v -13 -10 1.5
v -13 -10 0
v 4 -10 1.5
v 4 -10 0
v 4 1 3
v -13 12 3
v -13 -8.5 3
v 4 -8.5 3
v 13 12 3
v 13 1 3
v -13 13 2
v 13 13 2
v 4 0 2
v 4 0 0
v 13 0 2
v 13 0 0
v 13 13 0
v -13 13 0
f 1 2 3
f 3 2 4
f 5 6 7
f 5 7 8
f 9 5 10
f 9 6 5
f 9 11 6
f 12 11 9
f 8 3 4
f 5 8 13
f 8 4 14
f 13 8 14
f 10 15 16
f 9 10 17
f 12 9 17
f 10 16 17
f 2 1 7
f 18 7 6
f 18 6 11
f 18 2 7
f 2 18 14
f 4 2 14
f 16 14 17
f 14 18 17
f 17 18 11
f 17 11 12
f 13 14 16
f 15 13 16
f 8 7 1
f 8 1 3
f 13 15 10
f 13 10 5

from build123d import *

# Parameters (mm, degrees)
SKETCH_1_W          = 26
SKETCH_1_H          = 23
EXTRUDE_1_DEPTH     = 3
CHAMFER_1_SIZE      = 1.5
CUT_EXTRUDE_1_DEPTH = 4
CHAMFER_2_SIZE      = 1


with BuildPart() as part:
    # Эскиз1 → Вытянуть1 (new body)
    with BuildSketch(Plane.XY):
        with Locations((0, 1.5)):
            Rectangle(SKETCH_1_W, SKETCH_1_H)
    extrude(amount=EXTRUDE_1_DEPTH)

    # Фаска1
    chamfer_1_edges = [part.edges().sort_by_distance(p)[0] for p in [
        (0, -10, 3),
    ]]
    chamfer(chamfer_1_edges, length=CHAMFER_1_SIZE)

    # Эскиз2 → Вырез-Вытянуть1 (cut, through all)
    with BuildSketch(Plane(origin=(0, 0, 0), x_dir=(-1, 0, 0), z_dir=(0, 0, -1))):
        Polygon((-81.137767415, 0), (-13, 0), (-4, 0), (-4, -10), (-4, -78.137767415), (-100.979926637, -173.876553822), (-178.117694052, -95.738786407), align=None)
    extrude(amount=-CUT_EXTRUDE_1_DEPTH, mode=Mode.SUBTRACT)

    # Фаска2
    chamfer_2_edges = [part.edges().sort_by_distance(p)[0] for p in [
        (0, 13, 3),
        (8.5, 0, 3),
    ]]
    chamfer(chamfer_2_edges, length=CHAMFER_2_SIZE)


solid = part.part
